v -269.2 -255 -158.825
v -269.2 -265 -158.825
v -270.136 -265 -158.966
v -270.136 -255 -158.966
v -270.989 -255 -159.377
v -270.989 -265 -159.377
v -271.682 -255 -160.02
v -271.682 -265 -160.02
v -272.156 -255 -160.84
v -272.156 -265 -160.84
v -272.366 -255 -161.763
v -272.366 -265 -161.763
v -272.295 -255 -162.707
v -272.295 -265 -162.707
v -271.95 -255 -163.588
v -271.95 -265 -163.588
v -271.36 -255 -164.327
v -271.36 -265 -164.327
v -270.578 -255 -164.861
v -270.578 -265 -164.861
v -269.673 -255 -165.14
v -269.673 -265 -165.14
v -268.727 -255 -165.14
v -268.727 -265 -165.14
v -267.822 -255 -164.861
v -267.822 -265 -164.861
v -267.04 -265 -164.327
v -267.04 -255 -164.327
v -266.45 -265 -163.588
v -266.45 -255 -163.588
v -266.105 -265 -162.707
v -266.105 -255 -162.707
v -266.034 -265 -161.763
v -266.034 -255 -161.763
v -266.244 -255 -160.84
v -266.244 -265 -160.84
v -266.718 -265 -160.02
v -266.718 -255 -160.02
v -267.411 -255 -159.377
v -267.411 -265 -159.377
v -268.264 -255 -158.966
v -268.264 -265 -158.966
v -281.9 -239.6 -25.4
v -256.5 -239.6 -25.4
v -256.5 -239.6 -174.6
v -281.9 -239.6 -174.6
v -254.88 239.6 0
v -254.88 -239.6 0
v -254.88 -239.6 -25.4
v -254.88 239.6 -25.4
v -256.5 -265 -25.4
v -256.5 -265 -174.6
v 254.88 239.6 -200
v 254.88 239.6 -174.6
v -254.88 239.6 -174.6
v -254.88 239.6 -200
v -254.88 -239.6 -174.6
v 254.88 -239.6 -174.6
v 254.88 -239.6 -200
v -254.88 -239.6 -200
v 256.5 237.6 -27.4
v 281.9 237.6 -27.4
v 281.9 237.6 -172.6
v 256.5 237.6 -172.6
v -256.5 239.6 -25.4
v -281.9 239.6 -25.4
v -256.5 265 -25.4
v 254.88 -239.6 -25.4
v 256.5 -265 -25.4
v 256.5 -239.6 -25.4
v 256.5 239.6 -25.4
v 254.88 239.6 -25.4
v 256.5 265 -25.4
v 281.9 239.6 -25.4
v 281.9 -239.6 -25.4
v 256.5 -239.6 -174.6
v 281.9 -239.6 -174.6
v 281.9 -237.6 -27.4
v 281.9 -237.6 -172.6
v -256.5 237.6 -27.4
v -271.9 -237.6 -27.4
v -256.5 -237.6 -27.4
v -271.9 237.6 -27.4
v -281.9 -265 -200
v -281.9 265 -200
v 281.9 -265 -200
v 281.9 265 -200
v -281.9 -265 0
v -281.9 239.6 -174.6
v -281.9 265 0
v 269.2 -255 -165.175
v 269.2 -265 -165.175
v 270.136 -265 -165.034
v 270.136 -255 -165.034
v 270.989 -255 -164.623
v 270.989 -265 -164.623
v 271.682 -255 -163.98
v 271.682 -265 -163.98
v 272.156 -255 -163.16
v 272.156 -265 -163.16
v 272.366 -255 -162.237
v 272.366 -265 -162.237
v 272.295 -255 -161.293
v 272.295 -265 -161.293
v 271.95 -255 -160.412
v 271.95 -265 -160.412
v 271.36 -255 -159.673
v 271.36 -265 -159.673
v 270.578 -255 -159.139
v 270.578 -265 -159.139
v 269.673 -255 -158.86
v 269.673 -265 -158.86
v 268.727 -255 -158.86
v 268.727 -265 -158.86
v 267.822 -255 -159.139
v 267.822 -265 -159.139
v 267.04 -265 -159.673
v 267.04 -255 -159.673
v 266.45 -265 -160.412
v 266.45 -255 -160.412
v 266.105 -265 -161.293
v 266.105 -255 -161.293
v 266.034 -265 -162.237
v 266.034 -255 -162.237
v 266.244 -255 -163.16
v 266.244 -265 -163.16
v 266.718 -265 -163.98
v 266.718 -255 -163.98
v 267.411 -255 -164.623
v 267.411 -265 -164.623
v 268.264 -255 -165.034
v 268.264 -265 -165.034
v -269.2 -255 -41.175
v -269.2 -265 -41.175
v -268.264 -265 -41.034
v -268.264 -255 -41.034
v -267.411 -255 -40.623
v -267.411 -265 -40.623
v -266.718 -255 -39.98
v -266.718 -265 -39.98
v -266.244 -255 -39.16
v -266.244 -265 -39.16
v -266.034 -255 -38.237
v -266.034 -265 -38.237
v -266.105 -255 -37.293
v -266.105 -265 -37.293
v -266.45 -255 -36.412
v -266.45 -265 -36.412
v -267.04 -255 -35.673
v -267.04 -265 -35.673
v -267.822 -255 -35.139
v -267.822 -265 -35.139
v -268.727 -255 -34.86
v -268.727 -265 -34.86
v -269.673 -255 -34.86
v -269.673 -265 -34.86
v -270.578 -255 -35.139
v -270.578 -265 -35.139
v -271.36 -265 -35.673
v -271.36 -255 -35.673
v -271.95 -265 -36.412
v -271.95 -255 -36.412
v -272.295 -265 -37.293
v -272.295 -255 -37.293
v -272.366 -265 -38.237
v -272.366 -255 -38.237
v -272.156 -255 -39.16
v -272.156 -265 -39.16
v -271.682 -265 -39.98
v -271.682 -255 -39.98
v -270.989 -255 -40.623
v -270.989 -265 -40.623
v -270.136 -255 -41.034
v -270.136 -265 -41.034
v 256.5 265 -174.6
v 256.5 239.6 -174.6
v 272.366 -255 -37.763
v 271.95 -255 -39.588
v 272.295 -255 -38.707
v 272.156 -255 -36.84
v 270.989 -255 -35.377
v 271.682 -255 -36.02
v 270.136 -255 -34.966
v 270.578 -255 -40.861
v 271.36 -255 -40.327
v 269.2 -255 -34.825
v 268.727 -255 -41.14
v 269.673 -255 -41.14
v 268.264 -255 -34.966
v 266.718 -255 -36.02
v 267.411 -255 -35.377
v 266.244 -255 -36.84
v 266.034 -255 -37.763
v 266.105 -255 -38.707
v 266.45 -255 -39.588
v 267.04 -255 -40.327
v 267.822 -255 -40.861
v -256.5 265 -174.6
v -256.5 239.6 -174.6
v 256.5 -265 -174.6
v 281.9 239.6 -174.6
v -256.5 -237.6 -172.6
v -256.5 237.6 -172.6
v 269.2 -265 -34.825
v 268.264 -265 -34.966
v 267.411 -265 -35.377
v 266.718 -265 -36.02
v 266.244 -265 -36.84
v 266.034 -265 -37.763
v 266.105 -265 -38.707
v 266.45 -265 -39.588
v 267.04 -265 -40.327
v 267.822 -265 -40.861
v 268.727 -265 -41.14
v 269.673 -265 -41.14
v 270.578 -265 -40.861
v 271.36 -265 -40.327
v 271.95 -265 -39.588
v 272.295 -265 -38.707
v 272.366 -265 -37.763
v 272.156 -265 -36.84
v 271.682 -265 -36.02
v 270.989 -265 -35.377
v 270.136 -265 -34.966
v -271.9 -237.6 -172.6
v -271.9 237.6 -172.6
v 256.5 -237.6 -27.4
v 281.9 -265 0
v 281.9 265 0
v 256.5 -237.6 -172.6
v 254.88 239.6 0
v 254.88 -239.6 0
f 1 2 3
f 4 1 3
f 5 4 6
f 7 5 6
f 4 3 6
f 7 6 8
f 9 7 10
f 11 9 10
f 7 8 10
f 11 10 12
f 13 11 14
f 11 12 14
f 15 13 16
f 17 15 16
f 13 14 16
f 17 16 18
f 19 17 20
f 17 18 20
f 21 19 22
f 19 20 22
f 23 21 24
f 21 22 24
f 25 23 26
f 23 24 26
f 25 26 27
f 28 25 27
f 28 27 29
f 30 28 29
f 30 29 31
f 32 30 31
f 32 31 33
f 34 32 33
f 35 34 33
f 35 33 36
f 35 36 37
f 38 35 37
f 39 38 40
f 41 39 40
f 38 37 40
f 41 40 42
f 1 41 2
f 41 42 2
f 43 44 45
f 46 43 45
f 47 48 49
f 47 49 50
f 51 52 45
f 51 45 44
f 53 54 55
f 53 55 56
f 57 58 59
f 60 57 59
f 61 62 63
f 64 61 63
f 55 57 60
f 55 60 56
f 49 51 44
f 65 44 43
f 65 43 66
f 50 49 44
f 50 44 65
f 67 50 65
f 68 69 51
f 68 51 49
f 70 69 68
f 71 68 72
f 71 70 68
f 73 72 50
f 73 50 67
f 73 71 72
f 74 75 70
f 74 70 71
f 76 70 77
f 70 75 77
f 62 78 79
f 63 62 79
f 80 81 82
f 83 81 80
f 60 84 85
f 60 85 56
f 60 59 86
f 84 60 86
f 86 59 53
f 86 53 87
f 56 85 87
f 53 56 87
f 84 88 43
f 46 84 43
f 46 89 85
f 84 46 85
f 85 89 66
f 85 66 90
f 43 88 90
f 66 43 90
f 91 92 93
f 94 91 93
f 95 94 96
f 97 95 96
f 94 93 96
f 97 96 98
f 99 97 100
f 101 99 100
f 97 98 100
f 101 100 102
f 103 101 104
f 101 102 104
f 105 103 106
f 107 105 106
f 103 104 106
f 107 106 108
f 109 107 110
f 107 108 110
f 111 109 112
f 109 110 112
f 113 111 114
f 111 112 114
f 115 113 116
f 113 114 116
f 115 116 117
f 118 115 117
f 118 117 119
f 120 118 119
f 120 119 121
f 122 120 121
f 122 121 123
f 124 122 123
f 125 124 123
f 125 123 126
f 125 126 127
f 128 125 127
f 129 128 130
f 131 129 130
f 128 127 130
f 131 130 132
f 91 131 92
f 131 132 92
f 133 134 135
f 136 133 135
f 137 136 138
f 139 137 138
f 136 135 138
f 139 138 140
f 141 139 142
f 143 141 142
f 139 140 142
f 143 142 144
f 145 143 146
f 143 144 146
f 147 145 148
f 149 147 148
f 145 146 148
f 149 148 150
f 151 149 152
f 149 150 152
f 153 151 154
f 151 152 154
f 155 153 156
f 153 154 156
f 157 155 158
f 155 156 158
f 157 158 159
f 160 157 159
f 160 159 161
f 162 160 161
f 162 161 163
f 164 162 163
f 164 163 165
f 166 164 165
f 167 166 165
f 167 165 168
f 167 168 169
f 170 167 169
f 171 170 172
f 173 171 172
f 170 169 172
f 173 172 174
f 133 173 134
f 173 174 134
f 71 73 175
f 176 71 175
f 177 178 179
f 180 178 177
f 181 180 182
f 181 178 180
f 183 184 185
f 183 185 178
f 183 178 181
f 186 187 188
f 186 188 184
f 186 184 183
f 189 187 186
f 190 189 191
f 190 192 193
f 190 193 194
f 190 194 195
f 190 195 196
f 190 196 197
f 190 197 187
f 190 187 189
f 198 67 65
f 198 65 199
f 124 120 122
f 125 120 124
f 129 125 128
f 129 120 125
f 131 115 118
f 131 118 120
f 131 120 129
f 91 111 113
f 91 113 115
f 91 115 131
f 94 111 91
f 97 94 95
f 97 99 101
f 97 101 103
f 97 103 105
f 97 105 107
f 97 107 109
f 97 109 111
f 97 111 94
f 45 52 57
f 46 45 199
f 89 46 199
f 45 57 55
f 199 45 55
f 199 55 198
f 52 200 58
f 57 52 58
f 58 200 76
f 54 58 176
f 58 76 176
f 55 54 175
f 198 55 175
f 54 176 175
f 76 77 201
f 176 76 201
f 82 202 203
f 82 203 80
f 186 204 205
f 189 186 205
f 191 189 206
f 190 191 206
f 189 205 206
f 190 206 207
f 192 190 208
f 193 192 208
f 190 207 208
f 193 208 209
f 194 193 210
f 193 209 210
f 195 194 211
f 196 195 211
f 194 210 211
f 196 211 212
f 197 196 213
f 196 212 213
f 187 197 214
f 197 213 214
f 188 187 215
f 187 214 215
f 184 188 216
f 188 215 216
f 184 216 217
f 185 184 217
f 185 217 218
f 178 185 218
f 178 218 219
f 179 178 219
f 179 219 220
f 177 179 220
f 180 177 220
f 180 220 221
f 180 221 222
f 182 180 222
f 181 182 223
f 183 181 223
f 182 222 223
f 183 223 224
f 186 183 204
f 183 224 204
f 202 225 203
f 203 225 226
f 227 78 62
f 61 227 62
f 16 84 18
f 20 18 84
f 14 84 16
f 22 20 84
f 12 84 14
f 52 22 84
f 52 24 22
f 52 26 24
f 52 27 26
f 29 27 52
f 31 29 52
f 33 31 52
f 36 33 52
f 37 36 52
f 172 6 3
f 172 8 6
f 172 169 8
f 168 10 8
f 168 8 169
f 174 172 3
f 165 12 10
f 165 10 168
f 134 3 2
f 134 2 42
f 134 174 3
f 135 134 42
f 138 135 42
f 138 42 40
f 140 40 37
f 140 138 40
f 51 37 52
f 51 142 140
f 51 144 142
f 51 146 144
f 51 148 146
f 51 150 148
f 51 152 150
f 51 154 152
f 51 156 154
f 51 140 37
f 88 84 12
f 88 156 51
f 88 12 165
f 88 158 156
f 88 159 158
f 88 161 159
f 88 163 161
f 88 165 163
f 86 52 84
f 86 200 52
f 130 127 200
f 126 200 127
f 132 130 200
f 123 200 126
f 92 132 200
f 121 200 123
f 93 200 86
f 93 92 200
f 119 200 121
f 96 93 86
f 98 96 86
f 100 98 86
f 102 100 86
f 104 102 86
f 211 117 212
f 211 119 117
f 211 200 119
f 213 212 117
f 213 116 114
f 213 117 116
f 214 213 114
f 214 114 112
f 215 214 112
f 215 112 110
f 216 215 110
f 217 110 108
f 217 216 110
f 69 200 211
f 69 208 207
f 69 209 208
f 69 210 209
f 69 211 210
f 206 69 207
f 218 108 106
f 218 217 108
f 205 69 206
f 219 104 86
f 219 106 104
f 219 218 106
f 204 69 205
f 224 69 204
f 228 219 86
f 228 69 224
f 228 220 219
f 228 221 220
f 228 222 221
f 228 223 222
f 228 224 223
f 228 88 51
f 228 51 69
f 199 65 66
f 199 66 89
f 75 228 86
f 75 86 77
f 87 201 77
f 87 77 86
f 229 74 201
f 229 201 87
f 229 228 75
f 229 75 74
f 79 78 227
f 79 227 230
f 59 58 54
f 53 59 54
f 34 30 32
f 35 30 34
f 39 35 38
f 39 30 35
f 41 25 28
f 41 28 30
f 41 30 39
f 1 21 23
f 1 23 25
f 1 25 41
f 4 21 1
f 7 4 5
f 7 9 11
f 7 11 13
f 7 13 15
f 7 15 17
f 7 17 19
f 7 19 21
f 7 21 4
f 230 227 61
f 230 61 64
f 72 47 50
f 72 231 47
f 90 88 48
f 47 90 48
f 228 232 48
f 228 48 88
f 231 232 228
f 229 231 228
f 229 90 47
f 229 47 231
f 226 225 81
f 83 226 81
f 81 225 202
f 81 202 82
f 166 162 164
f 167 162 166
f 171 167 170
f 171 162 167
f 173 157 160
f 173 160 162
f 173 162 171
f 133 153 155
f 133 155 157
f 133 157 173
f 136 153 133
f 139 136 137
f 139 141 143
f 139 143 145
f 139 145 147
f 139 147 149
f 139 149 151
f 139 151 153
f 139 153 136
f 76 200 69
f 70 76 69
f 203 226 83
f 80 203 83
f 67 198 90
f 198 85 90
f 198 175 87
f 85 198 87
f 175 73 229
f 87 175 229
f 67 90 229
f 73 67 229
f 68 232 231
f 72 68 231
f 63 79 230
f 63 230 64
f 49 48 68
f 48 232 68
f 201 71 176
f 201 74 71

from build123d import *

# Parameters (mm, degrees)
CROQUIS1_W              = 563.8
CROQUIS1_H              = 530
CROQUIS1_W_2            = 509.760301886
CROQUIS1_H_2            = 479.2
SALIENTE_EXTRUIR1_DEPTH = 200
CORTAR_EXTRUIR1_REACH   = 656.29
CROQUIS2_W              = 149.2
CROQUIS2_H              = 479.2
CROQUIS3_W              = 513
CROQUIS3_H              = 149.2
CORTAR_EXTRUIR2_DEPTH   = 410
CROQUIS4_W              = 513
CROQUIS4_H              = 149.2
CORTAR_EXTRUIR3_DEPTH   = 40
CROQUIS5_W              = 145.2
CROQUIS5_H              = 475.2
SALIENTE_EXTRUIR2_DEPTH = 25.4
CROQUIS6_W              = 145.2
CROQUIS6_H              = 475.2
SALIENTE_EXTRUIR3_DEPTH = 25.4
CROQUIS9_W              = 145.2
CROQUIS9_H              = 475.2
CORTAR_EXTRUIR4_DEPTH   = 10
CROQUIS10_R             = 3.175
CORTAR_EXTRUIR5_DEPTH   = 10


with BuildPart() as part:
    # Croquis1 → Saliente-Extruir1 (new body)
    with BuildSketch(Plane.XY):
        Rectangle(CROQUIS1_W, CROQUIS1_H)
        Rectangle(CROQUIS1_W_2, CROQUIS1_H_2, mode=Mode.SUBTRACT)
    extrude(amount=-SALIENTE_EXTRUIR1_DEPTH)

    # Cortar-Extruir1: up to this face of the body (flat: up to its plane)
    cortar_extruir1_end = Plane(part.part.faces().sort_by_distance((-281.9, 0, -100))[0])
    # Croquis2 → Cortar-Extruir1 (cut, up to the picked face)
    with BuildSketch(Plane(origin=(281.9, 0, 0), x_dir=(0, 0, -1), z_dir=(1, 0, 0)), mode=Mode.PRIVATE) as cortar_extruir1_sk1:
        with Locations((100, 0)):
            Rectangle(CROQUIS2_W, CROQUIS2_H)
    cortar_extruir1_tool1 = split(extrude(cortar_extruir1_sk1.sketch, amount=-CORTAR_EXTRUIR1_REACH, mode=Mode.PRIVATE), bisect_by=cortar_extruir1_end, keep=Keep.BOTH, mode=Mode.PRIVATE)
    add(cortar_extruir1_tool1.solids().sort_by(Axis((281.9, 0, -100), (-1, 0, 0)))[0], mode=Mode.SUBTRACT)

    # Croquis3 → Cortar-Extruir2 (cut)
    with BuildSketch(Plane(origin=(0, 265, 0), x_dir=(1, 0, 0), z_dir=(0, 1, 0))):
        with Locations((0, 100)):
            Rectangle(CROQUIS3_W, CROQUIS3_H)
    extrude(amount=-CORTAR_EXTRUIR2_DEPTH, mode=Mode.SUBTRACT)

    # Croquis4 → Cortar-Extruir3 (cut)
    with BuildSketch(Plane.XZ.offset(265)):
        with Locations((0, -100)):
            Rectangle(CROQUIS4_W, CROQUIS4_H)
    extrude(amount=-CORTAR_EXTRUIR3_DEPTH, mode=Mode.SUBTRACT)

    # Croquis10 → Cortar-Extruir5 (cut)
    with BuildSketch(Plane.XZ.offset(265)):
        with Locations(Location((269.2, -162, 0), (0, 0, 270))):
            Circle(CROQUIS10_R)
        with Locations(Location((-269.2, -162, 0), (0, 0, 90))):
            Circle(CROQUIS10_R)
        with Locations(Location((-269.2, -38, 0), (0, 0, 270))):
            Circle(CROQUIS10_R)
        with Locations(Location((269.2, -38, 0), (0, 0, 90))):
            Circle(CROQUIS10_R)
    extrude(amount=-CORTAR_EXTRUIR5_DEPTH, mode=Mode.SUBTRACT)


with BuildPart() as body_2:
    # Croquis5 → Saliente-Extruir2 (new body)
    with BuildSketch(Plane(origin=(281.9, 0, 0), x_dir=(0, 0, -1), z_dir=(1, 0, 0))):
        with Locations((100, 0)):
            Rectangle(CROQUIS5_W, CROQUIS5_H)
    extrude(amount=-SALIENTE_EXTRUIR2_DEPTH)


with BuildPart() as body_3:
    # Croquis6 → Saliente-Extruir3 (new body)
    with BuildSketch(Plane.ZY.offset(281.9)):
        with Locations((-100, 0)):
            Rectangle(CROQUIS6_W, CROQUIS6_H)
    extrude(amount=-SALIENTE_EXTRUIR3_DEPTH)

    # Croquis9 → Cortar-Extruir4 (cut)
    with BuildSketch(Plane.ZY.offset(281.9)):
        with Locations((-100, 0)):
            Rectangle(CROQUIS9_W, CROQUIS9_H)
    extrude(amount=-CORTAR_EXTRUIR4_DEPTH, mode=Mode.SUBTRACT)


solid = Compound([part.part, body_2.part, body_3.part])
